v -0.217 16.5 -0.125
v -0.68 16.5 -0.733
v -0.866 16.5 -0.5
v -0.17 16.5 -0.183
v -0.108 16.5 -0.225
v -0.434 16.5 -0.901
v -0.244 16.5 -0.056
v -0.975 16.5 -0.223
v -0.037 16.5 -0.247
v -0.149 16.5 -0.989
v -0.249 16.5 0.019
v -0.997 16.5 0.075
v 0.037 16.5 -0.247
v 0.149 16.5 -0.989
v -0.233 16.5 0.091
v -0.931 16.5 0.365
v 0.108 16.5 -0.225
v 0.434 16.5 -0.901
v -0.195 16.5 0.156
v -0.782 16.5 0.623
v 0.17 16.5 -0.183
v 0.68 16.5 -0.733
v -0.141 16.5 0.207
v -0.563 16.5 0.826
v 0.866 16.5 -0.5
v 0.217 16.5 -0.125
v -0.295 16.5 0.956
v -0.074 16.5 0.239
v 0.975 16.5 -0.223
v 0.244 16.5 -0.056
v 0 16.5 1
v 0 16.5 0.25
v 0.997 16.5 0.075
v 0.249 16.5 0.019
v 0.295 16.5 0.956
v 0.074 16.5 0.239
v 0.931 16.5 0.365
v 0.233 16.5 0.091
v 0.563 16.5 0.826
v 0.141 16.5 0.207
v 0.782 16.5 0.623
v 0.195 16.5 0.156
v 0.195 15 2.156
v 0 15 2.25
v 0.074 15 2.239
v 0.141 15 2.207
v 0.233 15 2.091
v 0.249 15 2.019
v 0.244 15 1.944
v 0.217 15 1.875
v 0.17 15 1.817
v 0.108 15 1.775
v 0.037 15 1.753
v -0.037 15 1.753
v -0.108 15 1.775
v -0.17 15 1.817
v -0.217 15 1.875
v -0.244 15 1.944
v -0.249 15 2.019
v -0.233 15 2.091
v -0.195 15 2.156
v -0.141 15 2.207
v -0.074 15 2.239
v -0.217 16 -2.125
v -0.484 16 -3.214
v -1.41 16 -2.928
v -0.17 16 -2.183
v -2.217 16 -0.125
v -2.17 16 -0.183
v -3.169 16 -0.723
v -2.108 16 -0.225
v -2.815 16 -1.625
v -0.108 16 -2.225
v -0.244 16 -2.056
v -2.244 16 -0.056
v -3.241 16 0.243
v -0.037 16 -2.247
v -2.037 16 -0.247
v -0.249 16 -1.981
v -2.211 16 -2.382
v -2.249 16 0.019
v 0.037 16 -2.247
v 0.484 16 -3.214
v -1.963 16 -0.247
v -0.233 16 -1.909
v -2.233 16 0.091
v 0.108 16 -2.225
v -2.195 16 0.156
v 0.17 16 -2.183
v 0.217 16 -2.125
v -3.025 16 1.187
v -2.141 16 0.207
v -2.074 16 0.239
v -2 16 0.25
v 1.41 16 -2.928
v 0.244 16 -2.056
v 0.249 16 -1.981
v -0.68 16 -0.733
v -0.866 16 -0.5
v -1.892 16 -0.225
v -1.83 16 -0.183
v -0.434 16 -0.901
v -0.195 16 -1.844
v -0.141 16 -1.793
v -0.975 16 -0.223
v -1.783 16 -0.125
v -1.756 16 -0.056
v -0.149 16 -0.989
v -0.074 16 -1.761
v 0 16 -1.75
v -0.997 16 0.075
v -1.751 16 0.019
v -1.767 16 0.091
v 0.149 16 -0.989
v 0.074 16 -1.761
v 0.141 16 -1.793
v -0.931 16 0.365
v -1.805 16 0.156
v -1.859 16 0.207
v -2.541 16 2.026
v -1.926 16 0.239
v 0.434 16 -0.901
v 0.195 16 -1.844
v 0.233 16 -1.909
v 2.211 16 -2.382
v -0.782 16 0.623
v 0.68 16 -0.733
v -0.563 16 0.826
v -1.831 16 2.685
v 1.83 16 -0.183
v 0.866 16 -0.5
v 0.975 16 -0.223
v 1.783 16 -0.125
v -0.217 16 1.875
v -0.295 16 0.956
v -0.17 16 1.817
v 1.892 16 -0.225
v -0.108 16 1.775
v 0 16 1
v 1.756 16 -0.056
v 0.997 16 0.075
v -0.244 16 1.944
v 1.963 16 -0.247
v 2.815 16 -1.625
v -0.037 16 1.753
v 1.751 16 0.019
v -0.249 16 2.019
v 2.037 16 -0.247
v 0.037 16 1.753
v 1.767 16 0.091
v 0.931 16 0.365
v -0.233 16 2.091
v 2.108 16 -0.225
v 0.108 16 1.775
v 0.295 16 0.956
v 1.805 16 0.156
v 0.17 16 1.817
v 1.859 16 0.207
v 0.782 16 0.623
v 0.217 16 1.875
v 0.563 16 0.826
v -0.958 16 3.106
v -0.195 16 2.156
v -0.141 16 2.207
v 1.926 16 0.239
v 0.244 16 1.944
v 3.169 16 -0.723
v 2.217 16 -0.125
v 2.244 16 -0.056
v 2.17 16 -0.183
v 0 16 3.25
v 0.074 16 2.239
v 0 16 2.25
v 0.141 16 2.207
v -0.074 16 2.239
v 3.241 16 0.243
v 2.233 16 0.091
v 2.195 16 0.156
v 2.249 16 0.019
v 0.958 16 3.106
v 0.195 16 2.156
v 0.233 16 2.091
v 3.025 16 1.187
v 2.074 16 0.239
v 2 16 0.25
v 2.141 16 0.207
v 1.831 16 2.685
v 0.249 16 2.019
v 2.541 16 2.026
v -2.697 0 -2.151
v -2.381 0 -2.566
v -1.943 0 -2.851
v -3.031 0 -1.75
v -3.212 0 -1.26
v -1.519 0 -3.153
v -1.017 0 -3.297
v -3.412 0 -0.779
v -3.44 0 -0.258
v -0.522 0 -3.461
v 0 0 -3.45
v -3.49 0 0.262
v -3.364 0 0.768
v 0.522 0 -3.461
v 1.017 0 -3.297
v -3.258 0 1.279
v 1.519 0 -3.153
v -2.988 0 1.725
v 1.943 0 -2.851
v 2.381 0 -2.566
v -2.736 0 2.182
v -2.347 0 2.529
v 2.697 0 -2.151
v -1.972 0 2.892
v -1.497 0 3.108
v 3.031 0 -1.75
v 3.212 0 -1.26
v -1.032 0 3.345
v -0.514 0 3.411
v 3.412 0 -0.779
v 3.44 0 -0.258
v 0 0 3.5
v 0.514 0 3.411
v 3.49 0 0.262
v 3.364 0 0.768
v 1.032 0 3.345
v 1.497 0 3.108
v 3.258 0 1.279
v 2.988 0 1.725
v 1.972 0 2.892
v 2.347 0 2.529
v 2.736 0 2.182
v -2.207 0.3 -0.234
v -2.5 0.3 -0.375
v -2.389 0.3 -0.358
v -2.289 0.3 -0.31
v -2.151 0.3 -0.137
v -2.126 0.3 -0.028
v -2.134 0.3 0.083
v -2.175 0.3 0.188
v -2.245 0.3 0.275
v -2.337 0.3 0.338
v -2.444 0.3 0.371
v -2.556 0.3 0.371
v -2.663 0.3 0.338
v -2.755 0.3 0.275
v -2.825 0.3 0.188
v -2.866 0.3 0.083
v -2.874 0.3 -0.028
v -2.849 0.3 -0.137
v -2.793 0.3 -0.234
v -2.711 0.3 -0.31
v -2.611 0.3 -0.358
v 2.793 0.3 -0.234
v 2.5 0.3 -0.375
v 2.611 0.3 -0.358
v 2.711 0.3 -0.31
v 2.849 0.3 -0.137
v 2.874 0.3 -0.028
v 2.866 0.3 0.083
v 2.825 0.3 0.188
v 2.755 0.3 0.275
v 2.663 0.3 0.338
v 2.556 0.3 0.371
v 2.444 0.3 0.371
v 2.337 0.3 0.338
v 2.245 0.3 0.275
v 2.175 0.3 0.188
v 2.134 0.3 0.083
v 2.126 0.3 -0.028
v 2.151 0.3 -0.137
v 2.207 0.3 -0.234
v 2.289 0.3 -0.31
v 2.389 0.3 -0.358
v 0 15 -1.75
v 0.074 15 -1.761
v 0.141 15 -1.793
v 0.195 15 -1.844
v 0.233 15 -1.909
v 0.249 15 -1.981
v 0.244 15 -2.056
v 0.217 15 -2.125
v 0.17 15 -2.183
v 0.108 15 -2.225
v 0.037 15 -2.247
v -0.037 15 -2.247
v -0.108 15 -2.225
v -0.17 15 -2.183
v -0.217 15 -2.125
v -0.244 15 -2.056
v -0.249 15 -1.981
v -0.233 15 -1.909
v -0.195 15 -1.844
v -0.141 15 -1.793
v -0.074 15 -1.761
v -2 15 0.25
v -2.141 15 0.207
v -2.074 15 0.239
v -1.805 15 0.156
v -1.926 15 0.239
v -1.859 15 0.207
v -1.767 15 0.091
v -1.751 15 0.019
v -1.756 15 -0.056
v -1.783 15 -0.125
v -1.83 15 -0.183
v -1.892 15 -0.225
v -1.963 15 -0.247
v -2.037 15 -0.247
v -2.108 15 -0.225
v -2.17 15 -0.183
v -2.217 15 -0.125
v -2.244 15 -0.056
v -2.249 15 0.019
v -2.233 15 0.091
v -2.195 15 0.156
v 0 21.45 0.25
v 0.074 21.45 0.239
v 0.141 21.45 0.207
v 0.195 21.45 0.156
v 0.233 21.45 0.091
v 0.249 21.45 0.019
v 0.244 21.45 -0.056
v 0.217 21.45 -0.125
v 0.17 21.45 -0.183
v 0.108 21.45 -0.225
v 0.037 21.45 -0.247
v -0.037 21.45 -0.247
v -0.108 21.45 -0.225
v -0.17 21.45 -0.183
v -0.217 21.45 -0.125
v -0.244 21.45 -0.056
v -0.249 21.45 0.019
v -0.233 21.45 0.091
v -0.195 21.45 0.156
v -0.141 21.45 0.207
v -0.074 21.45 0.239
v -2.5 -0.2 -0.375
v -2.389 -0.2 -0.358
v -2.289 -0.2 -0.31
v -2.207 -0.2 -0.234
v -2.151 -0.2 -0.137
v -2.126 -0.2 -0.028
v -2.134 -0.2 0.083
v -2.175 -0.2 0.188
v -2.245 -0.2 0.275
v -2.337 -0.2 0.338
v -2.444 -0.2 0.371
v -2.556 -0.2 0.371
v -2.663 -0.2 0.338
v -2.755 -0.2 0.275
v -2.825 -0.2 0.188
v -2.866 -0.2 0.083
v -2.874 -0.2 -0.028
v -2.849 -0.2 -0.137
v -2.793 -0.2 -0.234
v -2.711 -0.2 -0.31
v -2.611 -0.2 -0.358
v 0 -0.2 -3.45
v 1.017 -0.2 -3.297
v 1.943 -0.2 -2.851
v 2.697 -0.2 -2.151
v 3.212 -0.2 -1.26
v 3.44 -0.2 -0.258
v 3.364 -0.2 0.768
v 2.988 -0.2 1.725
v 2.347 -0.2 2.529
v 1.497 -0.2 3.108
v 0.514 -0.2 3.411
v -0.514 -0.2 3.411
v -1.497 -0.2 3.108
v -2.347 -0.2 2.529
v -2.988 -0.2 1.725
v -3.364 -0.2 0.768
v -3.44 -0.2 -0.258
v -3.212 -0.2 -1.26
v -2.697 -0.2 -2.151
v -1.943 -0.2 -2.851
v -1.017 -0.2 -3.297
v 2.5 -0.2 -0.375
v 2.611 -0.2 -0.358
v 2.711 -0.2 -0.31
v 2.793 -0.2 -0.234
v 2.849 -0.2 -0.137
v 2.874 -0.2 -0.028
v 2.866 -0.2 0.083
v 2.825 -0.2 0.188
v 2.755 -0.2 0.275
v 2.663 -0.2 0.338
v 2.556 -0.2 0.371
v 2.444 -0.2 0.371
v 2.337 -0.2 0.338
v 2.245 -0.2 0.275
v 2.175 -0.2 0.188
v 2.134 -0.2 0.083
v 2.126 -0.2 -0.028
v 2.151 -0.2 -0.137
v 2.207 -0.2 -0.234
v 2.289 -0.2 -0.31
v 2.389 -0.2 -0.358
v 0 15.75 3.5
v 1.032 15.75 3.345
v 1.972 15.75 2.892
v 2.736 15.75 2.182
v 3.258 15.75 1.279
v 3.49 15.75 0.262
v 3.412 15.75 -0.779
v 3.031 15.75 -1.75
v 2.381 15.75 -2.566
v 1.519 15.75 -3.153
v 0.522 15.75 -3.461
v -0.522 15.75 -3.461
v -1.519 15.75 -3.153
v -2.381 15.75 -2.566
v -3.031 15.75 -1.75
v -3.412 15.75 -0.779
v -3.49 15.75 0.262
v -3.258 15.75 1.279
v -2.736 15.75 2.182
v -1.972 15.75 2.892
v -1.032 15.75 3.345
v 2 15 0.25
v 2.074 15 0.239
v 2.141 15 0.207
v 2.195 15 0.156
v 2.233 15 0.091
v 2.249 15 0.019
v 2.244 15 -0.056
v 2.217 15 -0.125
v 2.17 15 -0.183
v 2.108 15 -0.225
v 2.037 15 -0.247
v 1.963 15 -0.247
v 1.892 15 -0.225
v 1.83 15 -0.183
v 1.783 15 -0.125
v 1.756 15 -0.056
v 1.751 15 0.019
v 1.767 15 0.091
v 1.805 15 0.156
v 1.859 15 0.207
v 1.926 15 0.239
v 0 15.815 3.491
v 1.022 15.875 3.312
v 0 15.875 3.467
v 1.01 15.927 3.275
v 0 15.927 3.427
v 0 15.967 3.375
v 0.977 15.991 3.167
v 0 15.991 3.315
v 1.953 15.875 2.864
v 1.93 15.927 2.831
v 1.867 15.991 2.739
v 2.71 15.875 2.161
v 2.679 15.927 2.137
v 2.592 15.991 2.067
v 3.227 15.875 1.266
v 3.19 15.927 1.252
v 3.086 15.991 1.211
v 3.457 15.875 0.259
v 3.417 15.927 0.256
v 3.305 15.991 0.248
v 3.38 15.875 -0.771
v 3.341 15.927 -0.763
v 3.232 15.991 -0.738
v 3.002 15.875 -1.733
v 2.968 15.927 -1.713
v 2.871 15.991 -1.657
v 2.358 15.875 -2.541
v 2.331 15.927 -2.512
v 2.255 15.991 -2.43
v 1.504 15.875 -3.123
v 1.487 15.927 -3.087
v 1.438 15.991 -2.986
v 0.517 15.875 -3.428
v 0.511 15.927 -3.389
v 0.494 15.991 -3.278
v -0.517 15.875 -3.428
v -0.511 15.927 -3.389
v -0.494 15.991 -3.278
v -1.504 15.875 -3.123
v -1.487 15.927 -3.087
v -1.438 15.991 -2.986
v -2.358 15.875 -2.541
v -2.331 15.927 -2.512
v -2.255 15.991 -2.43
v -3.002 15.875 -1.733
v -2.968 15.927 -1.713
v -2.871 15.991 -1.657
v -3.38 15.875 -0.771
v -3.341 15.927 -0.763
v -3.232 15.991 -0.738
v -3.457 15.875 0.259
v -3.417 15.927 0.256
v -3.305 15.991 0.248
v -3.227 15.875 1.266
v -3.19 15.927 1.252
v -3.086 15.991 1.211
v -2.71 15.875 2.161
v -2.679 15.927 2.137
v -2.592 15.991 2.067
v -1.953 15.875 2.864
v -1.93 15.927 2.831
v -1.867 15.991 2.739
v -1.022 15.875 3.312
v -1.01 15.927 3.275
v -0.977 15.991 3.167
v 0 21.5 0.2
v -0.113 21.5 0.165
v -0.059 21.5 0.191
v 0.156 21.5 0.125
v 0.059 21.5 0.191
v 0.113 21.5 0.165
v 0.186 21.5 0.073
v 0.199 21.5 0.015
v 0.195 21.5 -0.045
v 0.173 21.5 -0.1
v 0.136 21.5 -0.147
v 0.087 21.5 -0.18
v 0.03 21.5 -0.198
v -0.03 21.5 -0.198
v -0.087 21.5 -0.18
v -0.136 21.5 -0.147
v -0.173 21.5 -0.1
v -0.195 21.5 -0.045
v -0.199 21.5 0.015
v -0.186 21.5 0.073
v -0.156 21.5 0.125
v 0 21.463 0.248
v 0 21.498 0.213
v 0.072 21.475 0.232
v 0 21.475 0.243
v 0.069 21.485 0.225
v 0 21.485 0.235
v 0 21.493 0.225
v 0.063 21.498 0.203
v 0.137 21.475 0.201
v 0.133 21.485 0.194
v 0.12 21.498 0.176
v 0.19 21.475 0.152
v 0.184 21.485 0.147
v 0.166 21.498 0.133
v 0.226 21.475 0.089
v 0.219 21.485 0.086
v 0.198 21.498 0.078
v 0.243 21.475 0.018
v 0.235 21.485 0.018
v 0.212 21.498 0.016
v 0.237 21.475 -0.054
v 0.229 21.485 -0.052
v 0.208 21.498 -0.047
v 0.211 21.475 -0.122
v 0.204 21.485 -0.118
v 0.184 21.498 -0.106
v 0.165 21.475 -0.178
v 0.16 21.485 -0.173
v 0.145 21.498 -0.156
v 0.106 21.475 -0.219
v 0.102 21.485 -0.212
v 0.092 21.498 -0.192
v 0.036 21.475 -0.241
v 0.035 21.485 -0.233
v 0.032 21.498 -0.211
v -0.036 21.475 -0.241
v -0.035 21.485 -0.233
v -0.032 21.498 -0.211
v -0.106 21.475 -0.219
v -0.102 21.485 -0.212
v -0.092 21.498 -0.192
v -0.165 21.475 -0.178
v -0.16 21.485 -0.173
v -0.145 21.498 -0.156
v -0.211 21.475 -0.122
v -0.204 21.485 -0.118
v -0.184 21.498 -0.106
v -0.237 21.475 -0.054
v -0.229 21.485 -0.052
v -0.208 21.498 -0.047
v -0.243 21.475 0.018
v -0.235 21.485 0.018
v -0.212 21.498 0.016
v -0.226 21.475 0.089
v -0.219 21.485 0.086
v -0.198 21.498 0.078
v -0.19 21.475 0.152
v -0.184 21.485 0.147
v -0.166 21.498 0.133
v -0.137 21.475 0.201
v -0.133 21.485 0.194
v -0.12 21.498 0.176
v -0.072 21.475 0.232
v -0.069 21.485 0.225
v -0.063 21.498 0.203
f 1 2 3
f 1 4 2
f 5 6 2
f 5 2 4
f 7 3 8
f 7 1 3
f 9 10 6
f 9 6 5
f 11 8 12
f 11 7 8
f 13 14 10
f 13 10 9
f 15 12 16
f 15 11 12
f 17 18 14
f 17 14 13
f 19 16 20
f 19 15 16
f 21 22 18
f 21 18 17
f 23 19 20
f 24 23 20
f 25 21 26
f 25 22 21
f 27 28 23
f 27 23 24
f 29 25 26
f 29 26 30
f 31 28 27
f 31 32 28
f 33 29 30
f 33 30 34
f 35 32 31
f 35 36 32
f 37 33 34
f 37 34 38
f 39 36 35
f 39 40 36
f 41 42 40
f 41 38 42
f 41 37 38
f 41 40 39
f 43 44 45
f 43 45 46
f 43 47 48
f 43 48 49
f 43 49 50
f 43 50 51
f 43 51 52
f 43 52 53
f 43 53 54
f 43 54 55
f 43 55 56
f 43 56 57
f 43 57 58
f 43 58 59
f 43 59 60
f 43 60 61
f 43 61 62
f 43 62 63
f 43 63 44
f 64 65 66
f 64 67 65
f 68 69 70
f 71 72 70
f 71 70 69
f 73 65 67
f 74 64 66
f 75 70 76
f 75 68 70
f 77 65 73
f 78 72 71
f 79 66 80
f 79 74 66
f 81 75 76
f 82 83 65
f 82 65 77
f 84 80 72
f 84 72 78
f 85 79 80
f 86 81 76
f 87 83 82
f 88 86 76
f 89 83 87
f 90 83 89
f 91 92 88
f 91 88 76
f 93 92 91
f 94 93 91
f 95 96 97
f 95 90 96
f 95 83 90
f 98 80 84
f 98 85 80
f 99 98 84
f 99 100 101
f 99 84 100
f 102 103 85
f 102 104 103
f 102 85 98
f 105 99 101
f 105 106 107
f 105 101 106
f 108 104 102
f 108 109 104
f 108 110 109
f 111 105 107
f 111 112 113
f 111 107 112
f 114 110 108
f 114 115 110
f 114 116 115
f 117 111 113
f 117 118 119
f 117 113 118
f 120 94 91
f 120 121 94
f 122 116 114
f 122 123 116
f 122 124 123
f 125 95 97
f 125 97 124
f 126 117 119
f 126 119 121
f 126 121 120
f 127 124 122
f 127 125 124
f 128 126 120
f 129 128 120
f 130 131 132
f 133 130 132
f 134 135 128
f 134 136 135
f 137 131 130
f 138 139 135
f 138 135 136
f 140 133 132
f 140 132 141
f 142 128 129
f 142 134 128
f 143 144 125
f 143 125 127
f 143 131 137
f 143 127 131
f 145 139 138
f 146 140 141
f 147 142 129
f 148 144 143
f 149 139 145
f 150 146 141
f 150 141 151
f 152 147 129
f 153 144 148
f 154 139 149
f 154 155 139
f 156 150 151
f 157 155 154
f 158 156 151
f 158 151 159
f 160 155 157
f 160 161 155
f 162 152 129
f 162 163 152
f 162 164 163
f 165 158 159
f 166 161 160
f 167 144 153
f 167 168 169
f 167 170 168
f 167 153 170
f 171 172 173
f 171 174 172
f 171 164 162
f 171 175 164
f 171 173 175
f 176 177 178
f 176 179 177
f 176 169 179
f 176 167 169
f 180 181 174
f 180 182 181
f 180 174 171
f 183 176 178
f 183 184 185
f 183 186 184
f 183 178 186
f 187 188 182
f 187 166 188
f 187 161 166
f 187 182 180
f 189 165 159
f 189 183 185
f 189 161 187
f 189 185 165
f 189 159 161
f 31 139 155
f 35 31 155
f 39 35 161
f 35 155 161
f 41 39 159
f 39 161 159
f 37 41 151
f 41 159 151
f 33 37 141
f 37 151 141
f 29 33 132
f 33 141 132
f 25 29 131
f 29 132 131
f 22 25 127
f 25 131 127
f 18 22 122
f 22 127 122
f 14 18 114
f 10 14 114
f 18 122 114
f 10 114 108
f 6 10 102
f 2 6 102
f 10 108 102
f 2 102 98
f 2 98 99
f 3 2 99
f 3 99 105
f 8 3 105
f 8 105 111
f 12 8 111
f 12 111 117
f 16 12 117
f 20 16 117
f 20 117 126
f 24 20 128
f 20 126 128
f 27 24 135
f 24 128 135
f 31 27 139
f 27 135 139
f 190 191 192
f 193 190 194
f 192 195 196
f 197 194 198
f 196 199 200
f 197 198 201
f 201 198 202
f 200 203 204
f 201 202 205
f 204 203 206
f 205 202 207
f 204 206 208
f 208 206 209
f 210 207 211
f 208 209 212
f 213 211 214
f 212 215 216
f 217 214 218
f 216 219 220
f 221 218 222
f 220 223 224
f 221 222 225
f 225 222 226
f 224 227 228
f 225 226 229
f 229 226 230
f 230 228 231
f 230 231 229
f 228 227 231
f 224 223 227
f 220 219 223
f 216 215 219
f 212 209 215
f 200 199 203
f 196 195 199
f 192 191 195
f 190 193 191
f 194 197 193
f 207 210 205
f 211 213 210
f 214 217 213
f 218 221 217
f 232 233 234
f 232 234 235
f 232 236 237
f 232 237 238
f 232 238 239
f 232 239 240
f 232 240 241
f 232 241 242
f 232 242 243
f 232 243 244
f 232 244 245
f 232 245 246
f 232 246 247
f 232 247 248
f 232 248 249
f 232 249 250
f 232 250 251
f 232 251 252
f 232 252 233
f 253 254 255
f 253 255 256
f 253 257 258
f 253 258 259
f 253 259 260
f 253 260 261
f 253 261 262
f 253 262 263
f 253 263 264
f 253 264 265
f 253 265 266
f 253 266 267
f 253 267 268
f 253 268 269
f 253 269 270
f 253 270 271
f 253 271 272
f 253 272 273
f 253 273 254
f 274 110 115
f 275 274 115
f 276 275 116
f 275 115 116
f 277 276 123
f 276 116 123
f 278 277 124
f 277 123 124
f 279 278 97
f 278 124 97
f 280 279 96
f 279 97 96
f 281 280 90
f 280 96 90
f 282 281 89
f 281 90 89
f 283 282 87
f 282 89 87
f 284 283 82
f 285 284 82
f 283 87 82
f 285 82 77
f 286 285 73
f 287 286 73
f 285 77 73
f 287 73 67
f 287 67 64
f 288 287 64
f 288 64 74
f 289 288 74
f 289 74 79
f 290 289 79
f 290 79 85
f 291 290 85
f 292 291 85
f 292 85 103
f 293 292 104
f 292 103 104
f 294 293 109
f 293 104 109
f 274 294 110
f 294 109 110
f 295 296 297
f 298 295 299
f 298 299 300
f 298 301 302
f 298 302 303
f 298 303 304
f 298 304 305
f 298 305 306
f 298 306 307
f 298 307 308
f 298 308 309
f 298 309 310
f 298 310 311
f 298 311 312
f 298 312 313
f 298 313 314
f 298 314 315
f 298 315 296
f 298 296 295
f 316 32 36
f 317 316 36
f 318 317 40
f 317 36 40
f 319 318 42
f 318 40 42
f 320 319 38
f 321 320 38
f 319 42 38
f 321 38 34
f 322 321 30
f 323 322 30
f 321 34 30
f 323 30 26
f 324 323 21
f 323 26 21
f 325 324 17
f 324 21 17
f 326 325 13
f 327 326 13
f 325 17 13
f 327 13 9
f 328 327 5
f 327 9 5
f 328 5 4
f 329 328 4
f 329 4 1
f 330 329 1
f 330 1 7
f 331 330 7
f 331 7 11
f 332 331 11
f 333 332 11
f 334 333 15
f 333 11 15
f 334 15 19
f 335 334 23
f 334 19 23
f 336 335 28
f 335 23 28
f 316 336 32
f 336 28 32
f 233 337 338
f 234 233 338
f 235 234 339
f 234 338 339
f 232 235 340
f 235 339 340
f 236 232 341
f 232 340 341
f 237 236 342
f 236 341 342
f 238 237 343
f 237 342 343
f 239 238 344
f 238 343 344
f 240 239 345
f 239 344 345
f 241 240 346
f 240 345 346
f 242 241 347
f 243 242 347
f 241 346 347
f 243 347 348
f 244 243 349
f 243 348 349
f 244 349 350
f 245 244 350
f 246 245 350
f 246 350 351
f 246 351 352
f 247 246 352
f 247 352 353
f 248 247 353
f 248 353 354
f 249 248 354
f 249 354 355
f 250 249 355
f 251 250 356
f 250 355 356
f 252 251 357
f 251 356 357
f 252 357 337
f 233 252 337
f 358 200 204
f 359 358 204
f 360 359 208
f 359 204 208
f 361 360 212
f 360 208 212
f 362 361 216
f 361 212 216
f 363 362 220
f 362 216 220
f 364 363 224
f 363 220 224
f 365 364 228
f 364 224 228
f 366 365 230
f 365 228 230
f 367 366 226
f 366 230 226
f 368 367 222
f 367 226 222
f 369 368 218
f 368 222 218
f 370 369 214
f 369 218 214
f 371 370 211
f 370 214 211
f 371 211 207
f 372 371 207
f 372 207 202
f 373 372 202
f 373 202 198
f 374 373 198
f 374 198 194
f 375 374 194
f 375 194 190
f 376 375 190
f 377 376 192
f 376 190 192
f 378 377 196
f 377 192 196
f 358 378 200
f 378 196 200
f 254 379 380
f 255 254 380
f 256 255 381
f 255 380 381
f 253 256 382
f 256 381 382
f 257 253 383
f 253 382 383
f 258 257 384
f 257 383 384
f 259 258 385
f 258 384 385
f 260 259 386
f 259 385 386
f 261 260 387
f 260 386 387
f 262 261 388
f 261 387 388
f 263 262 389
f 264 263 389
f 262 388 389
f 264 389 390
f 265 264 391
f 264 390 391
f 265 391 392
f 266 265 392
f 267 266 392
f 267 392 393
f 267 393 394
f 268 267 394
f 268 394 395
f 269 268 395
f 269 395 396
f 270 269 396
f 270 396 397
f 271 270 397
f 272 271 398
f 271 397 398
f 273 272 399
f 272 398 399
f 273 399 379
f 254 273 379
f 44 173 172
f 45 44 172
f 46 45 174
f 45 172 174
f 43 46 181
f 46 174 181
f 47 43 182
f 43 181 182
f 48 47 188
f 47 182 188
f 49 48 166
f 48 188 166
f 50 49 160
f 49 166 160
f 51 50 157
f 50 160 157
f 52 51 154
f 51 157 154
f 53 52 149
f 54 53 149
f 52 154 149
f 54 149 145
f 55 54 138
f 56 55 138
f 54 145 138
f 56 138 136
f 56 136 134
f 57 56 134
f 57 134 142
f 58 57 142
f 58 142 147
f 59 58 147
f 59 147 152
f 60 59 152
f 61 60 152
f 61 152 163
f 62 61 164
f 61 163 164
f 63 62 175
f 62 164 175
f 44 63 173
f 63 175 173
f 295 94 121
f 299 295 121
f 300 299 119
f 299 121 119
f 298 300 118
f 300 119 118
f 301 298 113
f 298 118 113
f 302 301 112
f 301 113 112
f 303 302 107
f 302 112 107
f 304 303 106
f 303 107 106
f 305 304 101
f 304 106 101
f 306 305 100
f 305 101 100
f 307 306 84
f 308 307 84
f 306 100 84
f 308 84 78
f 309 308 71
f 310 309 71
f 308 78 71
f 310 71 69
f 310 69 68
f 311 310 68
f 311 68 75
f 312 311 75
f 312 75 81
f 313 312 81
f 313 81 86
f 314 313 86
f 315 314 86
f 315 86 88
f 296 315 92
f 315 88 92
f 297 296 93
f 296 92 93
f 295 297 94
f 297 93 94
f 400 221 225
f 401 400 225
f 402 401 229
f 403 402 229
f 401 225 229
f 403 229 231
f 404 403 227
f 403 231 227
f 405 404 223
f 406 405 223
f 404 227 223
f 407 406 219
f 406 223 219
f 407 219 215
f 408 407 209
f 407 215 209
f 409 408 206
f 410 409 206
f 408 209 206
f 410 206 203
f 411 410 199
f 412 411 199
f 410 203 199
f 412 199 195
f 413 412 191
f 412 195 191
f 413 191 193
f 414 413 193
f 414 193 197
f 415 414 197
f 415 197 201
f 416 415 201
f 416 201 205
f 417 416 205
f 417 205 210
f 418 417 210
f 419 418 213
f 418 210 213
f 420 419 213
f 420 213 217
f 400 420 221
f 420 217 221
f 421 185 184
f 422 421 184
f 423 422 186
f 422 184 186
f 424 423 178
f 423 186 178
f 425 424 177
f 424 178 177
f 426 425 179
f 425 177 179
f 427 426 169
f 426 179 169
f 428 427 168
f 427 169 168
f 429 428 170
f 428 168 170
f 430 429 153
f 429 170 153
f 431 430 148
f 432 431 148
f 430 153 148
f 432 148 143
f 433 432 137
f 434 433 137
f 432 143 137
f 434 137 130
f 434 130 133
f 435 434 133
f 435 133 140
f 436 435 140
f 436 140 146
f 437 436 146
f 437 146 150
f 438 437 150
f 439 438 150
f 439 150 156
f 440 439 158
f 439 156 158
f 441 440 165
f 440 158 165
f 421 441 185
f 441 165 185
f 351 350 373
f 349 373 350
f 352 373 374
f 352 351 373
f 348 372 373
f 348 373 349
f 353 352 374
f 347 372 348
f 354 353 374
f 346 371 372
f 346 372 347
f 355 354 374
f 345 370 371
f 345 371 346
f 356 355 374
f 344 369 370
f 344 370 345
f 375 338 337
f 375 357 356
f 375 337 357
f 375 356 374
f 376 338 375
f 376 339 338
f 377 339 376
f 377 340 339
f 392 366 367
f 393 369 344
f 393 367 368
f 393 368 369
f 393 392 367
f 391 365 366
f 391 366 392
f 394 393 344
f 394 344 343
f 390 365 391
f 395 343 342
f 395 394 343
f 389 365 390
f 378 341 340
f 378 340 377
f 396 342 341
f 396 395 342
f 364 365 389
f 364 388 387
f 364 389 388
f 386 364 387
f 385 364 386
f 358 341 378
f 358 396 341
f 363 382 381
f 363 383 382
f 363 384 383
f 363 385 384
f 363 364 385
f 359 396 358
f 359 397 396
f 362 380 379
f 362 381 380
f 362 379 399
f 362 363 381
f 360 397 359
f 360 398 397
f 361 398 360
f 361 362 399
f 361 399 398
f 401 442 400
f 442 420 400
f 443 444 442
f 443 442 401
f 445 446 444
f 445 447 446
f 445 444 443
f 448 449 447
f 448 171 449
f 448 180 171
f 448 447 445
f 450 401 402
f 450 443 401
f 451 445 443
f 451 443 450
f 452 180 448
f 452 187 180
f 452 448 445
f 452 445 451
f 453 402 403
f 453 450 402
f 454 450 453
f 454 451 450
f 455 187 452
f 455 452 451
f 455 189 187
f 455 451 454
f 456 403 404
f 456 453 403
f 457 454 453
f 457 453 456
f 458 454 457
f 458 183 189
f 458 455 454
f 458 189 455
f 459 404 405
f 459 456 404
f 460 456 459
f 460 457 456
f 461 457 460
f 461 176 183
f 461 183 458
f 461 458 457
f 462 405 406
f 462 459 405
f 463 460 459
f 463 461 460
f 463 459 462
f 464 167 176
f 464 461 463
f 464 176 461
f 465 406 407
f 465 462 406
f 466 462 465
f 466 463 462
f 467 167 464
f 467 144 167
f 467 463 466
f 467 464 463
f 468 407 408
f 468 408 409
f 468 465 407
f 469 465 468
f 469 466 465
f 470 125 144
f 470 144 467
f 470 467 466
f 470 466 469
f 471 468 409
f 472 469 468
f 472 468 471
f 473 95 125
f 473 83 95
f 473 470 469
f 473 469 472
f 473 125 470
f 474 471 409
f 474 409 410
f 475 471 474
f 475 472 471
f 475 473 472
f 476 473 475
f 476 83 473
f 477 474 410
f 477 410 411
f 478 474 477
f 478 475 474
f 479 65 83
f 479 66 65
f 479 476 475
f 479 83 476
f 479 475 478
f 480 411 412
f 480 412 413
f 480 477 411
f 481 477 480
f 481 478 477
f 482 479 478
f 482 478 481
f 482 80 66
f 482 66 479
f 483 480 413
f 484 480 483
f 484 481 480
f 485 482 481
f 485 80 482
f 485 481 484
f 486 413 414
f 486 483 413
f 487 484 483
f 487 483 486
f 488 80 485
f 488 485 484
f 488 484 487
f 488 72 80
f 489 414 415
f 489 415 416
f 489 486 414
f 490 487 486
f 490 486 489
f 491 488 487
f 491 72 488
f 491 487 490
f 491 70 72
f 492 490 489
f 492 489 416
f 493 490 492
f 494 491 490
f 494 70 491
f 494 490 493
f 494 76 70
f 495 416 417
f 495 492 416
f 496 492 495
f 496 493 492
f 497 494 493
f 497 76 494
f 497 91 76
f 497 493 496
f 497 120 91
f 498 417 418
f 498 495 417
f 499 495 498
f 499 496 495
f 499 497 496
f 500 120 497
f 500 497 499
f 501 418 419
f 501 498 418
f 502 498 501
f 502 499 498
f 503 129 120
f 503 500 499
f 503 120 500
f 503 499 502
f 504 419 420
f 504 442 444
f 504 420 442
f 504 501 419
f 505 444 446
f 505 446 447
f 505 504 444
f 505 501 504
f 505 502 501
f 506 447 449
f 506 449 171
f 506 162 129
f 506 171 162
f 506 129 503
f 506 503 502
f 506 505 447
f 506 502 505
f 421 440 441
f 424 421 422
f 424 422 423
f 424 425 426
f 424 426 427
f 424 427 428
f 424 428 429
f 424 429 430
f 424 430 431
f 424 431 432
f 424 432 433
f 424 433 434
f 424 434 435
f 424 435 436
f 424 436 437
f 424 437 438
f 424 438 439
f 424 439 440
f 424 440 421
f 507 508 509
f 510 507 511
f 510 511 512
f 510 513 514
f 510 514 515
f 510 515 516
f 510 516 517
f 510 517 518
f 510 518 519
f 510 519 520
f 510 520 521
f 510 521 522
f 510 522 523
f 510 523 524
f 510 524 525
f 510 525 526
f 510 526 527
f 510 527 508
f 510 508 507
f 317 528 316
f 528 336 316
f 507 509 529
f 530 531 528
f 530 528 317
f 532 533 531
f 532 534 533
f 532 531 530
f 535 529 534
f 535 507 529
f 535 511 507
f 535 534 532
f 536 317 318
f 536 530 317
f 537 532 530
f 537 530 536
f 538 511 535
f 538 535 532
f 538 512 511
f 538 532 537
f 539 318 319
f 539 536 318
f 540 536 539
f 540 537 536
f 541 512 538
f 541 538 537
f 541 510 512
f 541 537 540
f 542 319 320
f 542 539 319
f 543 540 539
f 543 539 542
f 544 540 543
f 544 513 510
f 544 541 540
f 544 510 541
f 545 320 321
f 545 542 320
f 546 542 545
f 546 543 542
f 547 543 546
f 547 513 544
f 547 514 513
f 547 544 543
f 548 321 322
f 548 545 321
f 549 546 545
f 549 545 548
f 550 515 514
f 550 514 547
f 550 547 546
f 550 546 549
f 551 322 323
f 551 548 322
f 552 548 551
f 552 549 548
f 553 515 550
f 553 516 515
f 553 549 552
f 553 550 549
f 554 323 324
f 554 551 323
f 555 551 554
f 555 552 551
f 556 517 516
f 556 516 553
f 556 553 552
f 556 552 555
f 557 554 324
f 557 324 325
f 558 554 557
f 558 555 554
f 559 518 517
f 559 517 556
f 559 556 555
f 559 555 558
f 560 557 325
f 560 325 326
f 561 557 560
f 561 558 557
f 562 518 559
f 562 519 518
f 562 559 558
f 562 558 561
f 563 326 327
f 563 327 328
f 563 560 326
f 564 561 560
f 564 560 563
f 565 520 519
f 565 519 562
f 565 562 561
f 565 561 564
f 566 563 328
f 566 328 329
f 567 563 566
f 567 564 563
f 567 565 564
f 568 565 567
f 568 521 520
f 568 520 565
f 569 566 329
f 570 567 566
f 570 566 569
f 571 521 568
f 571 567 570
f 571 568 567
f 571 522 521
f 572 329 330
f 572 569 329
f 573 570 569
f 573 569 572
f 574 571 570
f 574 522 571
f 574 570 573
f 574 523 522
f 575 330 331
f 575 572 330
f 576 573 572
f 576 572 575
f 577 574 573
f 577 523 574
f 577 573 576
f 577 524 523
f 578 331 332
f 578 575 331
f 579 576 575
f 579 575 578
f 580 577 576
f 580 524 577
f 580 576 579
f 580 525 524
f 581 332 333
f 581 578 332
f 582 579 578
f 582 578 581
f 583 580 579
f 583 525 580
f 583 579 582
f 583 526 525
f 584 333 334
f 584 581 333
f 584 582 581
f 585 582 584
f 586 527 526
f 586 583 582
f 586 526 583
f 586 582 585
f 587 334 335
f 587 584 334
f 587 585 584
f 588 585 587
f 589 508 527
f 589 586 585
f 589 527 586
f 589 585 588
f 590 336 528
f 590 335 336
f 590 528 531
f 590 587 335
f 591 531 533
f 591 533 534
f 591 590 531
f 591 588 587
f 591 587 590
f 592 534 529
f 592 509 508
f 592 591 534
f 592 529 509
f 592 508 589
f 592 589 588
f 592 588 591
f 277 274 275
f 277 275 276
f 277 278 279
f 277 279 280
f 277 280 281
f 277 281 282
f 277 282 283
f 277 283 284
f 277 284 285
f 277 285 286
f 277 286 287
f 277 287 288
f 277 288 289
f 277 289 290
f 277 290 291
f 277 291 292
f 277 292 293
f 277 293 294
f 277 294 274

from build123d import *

# Parameters (mm, degrees)
ESBO_O1_R                = 3.5
RESSALTO_EXTRUS_O1_DEPTH = 16
ESBO_O2_R                = 3.45
RESSALTO_EXTRUS_O2_DEPTH = 0.2
ESBO_O3_R                = 0.375
CORTE_EXTRUS_O1_DEPTH    = 0.5
ESBO_O4_R                = 1
RESSALTO_EXTRUS_O3_DEPTH = 0.5
ESBO_O5_R                = 0.25
RESSALTO_EXTRUS_O4_DEPTH = 5
FILETE1_R                = 0.25
FILETE2_R                = 0.05
ESBO_O6_R                = 0.25
CORTE_EXTRUS_O2_DEPTH    = 1


with BuildPart() as part:
    # Esboço1 → Ressalto-extrusão1 (new body)
    with BuildSketch(Plane(origin=(0, 0, 0), x_dir=(1, 0, 0), z_dir=(0, 1, 0))):
        with Locations(Location((0, 0, 0), (0, 0, 270))):
            Circle(ESBO_O1_R)
    extrude(amount=RESSALTO_EXTRUS_O1_DEPTH)

    # Esboço2 → Ressalto-extrusão2 (add)
    with BuildSketch(Plane.XZ):
        with Locations(Location((0, 0, 0), (0, 0, 270))):
            Circle(ESBO_O2_R)
    extrude(amount=RESSALTO_EXTRUS_O2_DEPTH)

    # Esboço3 → Corte-extrusão1 (cut)
    with BuildSketch(Plane.XZ.offset(0.2)):
        with Locations(Location((-2.5, 0, 0), (0, 0, 270))):
            Circle(ESBO_O3_R)
        with Locations(Location((2.5, 0, 0), (0, 0, 270))):
            Circle(ESBO_O3_R)
    extrude(amount=-CORTE_EXTRUS_O1_DEPTH, mode=Mode.SUBTRACT)

    # Esboço4 → Ressalto-extrusão3 (add)
    with BuildSketch(Plane(origin=(0, 16, 0), x_dir=(1, 0, 0), z_dir=(0, 1, 0))):
        with Locations(Location((0, 0, 0), (0, 0, 270))):
            Circle(ESBO_O4_R)
    extrude(amount=RESSALTO_EXTRUS_O3_DEPTH)

    # Esboço5 → Ressalto-extrusão4 (add)
    with BuildSketch(Plane(origin=(0, 16.5, 0), x_dir=(1, 0, 0), z_dir=(0, 1, 0))):
        with Locations(Location((0, 0, 0), (0, 0, 270))):
            Circle(ESBO_O5_R)
    extrude(amount=RESSALTO_EXTRUS_O4_DEPTH)

    # Filete1
    filete1_edges = [part.edges().sort_by_distance(p)[0] for p in [
        (0, 16, -3.5),
    ]]
    fillet(filete1_edges, radius=FILETE1_R)

    # Filete2
    filete2_edges = [part.edges().sort_by_distance(p)[0] for p in [
        (0, 21.5, -0.25),
    ]]
    fillet(filete2_edges, radius=FILETE2_R)

    # Esboço6 → Corte-extrusão2 (cut)
    with BuildSketch(Plane(origin=(0, 16, 0), x_dir=(1, 0, 0), z_dir=(0, 1, 0))):
        with Locations(Location((0, 2, 0), (0, 0, 270))):
            Circle(ESBO_O6_R)
        with Locations(Location((2, 0, 0), (0, 0, 270))):
            Circle(ESBO_O6_R)
        with Locations(Location((0, -2, 0), (0, 0, 270))):
            Circle(ESBO_O6_R)
        with Locations(Location((-2, 0, 0), (0, 0, 270))):
            Circle(ESBO_O6_R)
    extrude(amount=-CORTE_EXTRUS_O2_DEPTH, mode=Mode.SUBTRACT)


solid = part.part
